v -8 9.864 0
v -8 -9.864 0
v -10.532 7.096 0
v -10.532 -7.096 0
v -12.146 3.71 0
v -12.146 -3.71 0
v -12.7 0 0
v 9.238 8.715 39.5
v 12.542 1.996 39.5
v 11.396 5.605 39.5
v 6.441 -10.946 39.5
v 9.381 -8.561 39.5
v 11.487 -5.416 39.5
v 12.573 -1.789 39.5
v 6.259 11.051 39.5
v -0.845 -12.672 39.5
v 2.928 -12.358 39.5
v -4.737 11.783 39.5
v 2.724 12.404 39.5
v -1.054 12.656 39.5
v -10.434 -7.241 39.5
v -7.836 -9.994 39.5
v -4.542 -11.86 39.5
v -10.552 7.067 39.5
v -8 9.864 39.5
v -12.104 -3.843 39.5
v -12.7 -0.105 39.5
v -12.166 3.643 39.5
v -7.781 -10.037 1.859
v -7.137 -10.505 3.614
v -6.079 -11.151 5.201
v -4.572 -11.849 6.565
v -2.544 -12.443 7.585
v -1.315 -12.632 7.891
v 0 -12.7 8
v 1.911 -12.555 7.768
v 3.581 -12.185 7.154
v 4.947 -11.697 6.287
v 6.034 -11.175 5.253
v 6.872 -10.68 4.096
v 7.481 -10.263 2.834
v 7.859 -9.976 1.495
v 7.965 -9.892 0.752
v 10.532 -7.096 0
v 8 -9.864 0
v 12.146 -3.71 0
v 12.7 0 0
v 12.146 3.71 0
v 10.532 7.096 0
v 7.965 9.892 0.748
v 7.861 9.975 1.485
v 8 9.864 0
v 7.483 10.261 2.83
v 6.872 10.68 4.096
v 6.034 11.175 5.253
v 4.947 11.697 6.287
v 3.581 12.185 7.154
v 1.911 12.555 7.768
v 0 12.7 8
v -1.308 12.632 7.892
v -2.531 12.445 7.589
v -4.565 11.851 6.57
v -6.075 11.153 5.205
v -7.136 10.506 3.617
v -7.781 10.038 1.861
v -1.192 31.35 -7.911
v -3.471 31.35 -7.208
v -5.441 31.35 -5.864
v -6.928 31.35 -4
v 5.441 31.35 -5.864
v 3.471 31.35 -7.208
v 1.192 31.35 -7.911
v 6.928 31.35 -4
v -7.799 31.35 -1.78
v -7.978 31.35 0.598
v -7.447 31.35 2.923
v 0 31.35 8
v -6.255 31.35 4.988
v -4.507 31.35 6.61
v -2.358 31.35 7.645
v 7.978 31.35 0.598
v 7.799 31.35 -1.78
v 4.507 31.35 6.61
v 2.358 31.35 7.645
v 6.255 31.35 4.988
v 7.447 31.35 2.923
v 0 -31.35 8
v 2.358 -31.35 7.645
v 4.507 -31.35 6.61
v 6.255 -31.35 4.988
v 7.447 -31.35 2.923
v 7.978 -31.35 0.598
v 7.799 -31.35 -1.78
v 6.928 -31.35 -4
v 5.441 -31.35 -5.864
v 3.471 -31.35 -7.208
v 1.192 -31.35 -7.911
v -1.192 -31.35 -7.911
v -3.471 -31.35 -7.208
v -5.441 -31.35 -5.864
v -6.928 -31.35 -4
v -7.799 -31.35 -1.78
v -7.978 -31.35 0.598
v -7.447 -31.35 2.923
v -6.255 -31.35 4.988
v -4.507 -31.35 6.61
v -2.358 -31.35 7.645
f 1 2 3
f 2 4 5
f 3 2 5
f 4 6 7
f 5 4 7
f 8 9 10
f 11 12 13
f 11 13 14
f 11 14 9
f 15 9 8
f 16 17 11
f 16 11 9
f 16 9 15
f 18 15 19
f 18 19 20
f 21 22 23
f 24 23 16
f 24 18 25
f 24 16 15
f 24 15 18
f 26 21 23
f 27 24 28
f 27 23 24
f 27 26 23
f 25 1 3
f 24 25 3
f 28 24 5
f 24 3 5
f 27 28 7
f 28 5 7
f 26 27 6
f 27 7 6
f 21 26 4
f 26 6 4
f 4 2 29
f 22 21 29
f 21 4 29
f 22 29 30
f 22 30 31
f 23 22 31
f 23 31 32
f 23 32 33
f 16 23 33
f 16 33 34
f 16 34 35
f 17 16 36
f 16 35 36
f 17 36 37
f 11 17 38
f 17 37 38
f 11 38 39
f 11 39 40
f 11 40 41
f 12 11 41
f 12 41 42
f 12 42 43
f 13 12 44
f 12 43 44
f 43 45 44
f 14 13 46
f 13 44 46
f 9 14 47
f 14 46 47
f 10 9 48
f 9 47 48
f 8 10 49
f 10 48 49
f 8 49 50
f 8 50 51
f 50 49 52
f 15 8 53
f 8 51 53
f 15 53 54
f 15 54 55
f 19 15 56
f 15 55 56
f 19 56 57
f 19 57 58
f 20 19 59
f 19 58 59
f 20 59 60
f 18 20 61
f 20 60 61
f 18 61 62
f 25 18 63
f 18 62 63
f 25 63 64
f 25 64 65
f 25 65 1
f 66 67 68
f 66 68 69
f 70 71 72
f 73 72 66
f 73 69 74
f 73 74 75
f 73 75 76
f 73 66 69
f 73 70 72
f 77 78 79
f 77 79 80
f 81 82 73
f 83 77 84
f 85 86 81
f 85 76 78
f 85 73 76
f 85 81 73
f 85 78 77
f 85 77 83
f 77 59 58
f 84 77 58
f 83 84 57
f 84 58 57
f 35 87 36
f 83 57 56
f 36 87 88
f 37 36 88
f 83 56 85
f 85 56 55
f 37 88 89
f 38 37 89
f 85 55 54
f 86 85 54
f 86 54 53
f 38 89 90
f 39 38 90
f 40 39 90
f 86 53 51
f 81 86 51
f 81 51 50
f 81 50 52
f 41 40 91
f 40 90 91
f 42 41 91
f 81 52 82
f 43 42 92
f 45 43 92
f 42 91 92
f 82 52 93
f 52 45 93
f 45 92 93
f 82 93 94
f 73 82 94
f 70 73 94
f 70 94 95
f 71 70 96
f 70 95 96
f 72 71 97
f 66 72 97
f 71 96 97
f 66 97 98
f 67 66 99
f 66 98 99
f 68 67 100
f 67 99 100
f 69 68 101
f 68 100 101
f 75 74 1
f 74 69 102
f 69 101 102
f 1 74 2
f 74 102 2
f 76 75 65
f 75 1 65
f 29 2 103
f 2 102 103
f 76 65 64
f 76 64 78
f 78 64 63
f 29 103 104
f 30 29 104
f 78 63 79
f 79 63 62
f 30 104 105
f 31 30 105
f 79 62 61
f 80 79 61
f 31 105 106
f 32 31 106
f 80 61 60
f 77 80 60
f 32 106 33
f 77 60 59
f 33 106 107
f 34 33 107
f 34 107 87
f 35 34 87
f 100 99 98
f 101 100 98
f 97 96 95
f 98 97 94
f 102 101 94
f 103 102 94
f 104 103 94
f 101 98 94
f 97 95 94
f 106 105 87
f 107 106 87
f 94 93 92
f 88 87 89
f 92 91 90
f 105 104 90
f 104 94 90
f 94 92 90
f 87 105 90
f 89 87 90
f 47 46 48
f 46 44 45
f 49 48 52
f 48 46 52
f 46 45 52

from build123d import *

# Parameters (mm, degrees)
BOSS_EXTRUDE1_DEPTH      = 31.35
BOSS_EXTRUDE1_DEPTH_BACK = 31.35
SKETCH1_R                = 8
SKETCH2_R                = 12.7
BOSS_EXTRUDE2_DEPTH      = 39.5


with BuildPart() as part:
    # Sketch1 → Boss-Extrude1 (new, two sides: drawn at the far end of the back side and taken through both)
    with BuildSketch(Plane(origin=(0, 0, 0), x_dir=(1, 0, 0), z_dir=(0, 1, 0)).offset(-BOSS_EXTRUDE1_DEPTH_BACK)):
        Circle(SKETCH1_R)
    extrude(amount=BOSS_EXTRUDE1_DEPTH + BOSS_EXTRUDE1_DEPTH_BACK)

    # Sketch2 → Boss-Extrude2 (add)
    with BuildSketch(Plane.XY):
        Circle(SKETCH2_R)
    extrude(amount=BOSS_EXTRUDE2_DEPTH)


solid = part.part
